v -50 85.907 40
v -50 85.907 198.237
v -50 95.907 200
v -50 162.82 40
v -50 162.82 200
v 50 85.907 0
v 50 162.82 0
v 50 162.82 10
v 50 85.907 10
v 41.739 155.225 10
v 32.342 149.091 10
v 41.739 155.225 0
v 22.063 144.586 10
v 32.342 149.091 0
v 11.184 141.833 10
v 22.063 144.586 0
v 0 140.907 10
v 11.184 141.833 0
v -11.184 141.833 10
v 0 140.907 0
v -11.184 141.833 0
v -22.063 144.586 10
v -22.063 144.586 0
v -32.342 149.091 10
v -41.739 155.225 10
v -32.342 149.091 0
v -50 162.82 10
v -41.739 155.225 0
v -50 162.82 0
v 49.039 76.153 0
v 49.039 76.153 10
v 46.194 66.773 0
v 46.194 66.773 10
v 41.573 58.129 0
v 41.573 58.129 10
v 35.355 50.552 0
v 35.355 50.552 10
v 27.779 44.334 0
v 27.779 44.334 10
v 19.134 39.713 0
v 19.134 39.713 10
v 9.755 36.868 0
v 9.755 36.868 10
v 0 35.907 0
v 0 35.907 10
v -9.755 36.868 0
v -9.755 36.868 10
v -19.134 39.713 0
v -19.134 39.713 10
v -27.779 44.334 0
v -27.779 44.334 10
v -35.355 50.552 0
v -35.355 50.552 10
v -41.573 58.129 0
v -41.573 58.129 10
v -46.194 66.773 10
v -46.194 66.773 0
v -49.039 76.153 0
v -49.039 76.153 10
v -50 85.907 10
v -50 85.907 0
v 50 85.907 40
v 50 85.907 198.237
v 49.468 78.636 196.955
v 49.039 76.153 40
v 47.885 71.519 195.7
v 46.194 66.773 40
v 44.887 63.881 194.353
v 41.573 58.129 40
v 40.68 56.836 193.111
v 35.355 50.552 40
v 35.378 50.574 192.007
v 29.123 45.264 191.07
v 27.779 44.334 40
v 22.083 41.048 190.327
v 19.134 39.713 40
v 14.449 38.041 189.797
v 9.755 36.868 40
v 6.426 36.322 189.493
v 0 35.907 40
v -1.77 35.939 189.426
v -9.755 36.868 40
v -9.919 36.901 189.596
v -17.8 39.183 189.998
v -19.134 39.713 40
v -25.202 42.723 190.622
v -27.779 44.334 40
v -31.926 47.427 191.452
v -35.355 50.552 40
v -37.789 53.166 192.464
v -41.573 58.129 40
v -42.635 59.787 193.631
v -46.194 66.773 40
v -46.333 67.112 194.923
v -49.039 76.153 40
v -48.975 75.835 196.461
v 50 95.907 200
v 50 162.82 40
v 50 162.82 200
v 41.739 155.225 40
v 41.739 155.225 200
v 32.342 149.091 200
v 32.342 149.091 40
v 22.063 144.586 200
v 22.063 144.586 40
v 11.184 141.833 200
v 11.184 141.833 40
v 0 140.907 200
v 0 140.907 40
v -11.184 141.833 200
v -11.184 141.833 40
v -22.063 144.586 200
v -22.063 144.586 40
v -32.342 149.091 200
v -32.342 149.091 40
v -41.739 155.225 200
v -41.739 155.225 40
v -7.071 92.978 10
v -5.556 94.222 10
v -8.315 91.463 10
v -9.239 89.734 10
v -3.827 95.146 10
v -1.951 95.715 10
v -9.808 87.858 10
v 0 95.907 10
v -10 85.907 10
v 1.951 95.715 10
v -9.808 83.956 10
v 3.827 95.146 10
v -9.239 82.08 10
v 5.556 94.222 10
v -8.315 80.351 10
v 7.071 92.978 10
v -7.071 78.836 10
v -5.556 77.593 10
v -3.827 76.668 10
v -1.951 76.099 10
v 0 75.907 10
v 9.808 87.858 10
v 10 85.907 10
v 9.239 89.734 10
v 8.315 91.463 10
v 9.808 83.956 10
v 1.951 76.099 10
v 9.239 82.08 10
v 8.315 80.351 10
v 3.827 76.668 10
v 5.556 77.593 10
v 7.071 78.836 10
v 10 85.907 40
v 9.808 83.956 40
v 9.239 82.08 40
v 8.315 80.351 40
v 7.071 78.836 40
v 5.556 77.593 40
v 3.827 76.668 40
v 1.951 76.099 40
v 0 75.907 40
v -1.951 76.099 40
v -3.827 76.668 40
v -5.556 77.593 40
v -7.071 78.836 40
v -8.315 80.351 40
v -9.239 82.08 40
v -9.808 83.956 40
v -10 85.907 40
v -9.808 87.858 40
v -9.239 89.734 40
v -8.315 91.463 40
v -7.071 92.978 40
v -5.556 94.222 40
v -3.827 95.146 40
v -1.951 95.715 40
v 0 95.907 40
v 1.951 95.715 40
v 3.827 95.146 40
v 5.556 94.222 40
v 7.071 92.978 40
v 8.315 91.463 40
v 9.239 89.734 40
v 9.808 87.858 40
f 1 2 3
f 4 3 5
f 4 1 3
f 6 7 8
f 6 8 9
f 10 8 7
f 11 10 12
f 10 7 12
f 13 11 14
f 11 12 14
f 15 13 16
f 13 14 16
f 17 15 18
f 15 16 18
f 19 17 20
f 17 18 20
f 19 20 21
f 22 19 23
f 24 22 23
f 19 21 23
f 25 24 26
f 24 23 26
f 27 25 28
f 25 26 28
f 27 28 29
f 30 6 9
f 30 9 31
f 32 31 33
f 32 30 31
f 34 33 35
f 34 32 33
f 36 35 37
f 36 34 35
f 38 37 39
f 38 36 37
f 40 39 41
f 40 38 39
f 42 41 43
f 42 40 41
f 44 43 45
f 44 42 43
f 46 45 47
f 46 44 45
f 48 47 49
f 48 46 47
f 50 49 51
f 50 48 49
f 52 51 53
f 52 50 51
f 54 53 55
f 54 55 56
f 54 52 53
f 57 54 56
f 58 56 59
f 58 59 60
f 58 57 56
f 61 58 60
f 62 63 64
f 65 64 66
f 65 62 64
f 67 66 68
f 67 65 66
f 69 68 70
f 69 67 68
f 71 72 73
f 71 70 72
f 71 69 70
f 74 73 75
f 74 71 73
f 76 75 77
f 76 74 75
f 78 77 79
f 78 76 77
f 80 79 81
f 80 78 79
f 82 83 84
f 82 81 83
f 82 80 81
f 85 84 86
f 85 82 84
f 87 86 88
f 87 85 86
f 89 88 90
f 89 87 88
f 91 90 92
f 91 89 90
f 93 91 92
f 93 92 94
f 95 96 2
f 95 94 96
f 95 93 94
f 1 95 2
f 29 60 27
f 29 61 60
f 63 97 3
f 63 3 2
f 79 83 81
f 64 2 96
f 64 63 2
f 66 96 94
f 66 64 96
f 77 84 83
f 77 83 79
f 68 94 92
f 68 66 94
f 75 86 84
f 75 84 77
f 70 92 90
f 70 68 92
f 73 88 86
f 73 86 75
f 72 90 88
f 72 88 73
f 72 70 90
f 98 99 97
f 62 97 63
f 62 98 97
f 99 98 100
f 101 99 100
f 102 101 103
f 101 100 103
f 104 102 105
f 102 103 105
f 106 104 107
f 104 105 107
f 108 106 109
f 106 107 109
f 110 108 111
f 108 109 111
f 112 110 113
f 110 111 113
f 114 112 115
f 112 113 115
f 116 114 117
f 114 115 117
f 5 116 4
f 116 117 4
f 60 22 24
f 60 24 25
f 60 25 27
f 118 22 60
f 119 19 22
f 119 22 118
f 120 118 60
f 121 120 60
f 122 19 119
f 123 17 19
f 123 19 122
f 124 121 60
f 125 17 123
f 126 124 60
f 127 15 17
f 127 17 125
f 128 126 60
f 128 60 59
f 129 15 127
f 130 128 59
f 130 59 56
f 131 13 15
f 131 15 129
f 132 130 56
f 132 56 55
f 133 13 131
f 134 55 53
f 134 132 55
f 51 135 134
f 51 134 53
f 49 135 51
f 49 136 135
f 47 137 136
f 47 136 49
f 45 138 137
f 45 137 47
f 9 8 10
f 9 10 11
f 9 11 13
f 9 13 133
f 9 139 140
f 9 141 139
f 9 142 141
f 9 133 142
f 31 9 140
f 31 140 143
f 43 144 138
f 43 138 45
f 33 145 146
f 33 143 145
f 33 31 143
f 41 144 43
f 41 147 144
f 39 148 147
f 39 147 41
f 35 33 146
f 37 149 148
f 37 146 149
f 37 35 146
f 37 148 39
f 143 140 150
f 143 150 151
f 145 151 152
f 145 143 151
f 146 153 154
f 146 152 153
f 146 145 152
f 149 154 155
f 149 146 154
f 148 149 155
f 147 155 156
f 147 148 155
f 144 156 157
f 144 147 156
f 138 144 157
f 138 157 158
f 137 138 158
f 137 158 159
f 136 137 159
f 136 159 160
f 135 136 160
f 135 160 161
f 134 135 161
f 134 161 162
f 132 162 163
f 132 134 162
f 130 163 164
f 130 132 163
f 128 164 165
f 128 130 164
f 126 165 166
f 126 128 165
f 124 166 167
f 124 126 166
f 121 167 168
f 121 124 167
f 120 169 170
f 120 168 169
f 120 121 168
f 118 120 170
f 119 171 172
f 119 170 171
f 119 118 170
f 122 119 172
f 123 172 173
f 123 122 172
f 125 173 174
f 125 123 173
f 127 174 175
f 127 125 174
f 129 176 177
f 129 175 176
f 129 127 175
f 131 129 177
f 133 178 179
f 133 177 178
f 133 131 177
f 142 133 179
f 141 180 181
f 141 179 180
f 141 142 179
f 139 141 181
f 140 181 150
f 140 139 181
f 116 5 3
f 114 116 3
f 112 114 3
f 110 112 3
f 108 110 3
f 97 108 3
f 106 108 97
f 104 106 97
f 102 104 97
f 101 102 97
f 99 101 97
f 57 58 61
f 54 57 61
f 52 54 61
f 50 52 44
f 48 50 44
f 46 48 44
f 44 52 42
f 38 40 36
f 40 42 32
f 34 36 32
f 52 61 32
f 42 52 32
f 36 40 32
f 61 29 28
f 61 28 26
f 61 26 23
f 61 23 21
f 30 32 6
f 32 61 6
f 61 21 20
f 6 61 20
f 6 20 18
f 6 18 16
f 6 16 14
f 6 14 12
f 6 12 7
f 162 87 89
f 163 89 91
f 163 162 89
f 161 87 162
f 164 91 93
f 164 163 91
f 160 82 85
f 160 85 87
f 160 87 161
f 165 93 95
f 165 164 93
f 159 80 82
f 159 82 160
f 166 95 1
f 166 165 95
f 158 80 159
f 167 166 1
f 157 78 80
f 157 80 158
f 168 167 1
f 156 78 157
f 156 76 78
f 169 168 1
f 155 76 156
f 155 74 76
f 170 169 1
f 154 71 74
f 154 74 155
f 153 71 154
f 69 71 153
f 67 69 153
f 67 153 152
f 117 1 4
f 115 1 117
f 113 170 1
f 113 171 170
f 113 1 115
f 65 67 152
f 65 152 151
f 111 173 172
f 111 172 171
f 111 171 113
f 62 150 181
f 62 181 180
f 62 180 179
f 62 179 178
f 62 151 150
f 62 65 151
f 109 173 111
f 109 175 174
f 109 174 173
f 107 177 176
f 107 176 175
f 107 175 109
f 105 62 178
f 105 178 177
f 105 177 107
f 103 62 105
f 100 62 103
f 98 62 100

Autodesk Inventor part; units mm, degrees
ref_plane "YZ Plane" through (0, 0, 0) normal (1, 0, 0) x (0, 1, 0)
ref_plane "XZ Plane" through (0, 0, 0) normal (0, 1, 0) x (-1, 0, 0)
ref_plane "XY Plane" through (0, 0, 0) normal (0, 0, 1) x (1, 0, 0)
sketch "Sketch1" plane through (0, 0, 0) normal (0, 0, 1) x (1, 0, 0)
  line L0 (0, 15.9441) -> (0, -15.9441) construction
  line L1 (11.6084, 0) -> (-11.6084, 0) construction
  line L2 (50, 162.8204) -> (50, 85.9072)
  line L3 (50, 85.9072) -> (-50, 85.9072)
  line L4 (-50, 85.9072) -> (-50, 162.8204)
  circle A0 centre (0, 85.9072) radius 50
  arc A1 (-50, 162.8204) -> (50, 162.8204) centre (0, 208.9072) ccw
  point P0 (0, 0)
  point P1 (0, 0)
  point P2 (0, 165.9072)
  dimension "d5" = 100
  dimension "d7" = 136
  dimension "d8" = 123
extrude "Extrusion1" add sketch "Sketch1" along normal blind 200
sketch "Sketch2" plane through (50, 85.9072, 0) normal (1, 0, 0) x (0, 0, -1)
  line L0 (-200, 10) -> (-186.1081, -68.7846)
  line L1 (-200, 10) -> (-200, -68.7846)
  line L2 (-200, -68.7846) -> (-186.1081, -68.7846)
  point P0 (0, -85.9072)
extrude "Extrusion2" cut sketch "Sketch2" against normal through all
sketch "Sketch3" plane through (50, 85.9072, 0) normal (1, 0, 0) x (0, 0, -1)
  line L0 (-40, 89.4296) -> (-10, 89.4296)
  line L1 (-10, 89.4296) -> (-10, -119.3946)
  line L2 (-10, -119.3946) -> (-40, -119.3946)
  line L3 (-40, -119.3946) -> (-40, 89.4296)
  line L4 (0, -50) -> (0, 0) projected
  line L5 (0, 76.9131) -> (-200, 76.9131) projected
  point P0 (0, -85.9072)
  dimension "d9" = 30
  dimension "d10" = 10
extrude "Extrusion3" cut sketch "Sketch3" against normal through all
sketch "Sketch4" plane through (50, 85.9072, 10) normal (0, 0, 1) x (1, 0, 0)
  arc A0 (-100, 0) -> (0, 0) centre (-50, 0) ccw projected
  circle A1 centre (-50, 0) radius 10
  point P0 (-50, -85.9072)
extrude "Extrusion4" add sketch "Sketch4" along normal blind 30
properties part number "CANH TAY 1"
